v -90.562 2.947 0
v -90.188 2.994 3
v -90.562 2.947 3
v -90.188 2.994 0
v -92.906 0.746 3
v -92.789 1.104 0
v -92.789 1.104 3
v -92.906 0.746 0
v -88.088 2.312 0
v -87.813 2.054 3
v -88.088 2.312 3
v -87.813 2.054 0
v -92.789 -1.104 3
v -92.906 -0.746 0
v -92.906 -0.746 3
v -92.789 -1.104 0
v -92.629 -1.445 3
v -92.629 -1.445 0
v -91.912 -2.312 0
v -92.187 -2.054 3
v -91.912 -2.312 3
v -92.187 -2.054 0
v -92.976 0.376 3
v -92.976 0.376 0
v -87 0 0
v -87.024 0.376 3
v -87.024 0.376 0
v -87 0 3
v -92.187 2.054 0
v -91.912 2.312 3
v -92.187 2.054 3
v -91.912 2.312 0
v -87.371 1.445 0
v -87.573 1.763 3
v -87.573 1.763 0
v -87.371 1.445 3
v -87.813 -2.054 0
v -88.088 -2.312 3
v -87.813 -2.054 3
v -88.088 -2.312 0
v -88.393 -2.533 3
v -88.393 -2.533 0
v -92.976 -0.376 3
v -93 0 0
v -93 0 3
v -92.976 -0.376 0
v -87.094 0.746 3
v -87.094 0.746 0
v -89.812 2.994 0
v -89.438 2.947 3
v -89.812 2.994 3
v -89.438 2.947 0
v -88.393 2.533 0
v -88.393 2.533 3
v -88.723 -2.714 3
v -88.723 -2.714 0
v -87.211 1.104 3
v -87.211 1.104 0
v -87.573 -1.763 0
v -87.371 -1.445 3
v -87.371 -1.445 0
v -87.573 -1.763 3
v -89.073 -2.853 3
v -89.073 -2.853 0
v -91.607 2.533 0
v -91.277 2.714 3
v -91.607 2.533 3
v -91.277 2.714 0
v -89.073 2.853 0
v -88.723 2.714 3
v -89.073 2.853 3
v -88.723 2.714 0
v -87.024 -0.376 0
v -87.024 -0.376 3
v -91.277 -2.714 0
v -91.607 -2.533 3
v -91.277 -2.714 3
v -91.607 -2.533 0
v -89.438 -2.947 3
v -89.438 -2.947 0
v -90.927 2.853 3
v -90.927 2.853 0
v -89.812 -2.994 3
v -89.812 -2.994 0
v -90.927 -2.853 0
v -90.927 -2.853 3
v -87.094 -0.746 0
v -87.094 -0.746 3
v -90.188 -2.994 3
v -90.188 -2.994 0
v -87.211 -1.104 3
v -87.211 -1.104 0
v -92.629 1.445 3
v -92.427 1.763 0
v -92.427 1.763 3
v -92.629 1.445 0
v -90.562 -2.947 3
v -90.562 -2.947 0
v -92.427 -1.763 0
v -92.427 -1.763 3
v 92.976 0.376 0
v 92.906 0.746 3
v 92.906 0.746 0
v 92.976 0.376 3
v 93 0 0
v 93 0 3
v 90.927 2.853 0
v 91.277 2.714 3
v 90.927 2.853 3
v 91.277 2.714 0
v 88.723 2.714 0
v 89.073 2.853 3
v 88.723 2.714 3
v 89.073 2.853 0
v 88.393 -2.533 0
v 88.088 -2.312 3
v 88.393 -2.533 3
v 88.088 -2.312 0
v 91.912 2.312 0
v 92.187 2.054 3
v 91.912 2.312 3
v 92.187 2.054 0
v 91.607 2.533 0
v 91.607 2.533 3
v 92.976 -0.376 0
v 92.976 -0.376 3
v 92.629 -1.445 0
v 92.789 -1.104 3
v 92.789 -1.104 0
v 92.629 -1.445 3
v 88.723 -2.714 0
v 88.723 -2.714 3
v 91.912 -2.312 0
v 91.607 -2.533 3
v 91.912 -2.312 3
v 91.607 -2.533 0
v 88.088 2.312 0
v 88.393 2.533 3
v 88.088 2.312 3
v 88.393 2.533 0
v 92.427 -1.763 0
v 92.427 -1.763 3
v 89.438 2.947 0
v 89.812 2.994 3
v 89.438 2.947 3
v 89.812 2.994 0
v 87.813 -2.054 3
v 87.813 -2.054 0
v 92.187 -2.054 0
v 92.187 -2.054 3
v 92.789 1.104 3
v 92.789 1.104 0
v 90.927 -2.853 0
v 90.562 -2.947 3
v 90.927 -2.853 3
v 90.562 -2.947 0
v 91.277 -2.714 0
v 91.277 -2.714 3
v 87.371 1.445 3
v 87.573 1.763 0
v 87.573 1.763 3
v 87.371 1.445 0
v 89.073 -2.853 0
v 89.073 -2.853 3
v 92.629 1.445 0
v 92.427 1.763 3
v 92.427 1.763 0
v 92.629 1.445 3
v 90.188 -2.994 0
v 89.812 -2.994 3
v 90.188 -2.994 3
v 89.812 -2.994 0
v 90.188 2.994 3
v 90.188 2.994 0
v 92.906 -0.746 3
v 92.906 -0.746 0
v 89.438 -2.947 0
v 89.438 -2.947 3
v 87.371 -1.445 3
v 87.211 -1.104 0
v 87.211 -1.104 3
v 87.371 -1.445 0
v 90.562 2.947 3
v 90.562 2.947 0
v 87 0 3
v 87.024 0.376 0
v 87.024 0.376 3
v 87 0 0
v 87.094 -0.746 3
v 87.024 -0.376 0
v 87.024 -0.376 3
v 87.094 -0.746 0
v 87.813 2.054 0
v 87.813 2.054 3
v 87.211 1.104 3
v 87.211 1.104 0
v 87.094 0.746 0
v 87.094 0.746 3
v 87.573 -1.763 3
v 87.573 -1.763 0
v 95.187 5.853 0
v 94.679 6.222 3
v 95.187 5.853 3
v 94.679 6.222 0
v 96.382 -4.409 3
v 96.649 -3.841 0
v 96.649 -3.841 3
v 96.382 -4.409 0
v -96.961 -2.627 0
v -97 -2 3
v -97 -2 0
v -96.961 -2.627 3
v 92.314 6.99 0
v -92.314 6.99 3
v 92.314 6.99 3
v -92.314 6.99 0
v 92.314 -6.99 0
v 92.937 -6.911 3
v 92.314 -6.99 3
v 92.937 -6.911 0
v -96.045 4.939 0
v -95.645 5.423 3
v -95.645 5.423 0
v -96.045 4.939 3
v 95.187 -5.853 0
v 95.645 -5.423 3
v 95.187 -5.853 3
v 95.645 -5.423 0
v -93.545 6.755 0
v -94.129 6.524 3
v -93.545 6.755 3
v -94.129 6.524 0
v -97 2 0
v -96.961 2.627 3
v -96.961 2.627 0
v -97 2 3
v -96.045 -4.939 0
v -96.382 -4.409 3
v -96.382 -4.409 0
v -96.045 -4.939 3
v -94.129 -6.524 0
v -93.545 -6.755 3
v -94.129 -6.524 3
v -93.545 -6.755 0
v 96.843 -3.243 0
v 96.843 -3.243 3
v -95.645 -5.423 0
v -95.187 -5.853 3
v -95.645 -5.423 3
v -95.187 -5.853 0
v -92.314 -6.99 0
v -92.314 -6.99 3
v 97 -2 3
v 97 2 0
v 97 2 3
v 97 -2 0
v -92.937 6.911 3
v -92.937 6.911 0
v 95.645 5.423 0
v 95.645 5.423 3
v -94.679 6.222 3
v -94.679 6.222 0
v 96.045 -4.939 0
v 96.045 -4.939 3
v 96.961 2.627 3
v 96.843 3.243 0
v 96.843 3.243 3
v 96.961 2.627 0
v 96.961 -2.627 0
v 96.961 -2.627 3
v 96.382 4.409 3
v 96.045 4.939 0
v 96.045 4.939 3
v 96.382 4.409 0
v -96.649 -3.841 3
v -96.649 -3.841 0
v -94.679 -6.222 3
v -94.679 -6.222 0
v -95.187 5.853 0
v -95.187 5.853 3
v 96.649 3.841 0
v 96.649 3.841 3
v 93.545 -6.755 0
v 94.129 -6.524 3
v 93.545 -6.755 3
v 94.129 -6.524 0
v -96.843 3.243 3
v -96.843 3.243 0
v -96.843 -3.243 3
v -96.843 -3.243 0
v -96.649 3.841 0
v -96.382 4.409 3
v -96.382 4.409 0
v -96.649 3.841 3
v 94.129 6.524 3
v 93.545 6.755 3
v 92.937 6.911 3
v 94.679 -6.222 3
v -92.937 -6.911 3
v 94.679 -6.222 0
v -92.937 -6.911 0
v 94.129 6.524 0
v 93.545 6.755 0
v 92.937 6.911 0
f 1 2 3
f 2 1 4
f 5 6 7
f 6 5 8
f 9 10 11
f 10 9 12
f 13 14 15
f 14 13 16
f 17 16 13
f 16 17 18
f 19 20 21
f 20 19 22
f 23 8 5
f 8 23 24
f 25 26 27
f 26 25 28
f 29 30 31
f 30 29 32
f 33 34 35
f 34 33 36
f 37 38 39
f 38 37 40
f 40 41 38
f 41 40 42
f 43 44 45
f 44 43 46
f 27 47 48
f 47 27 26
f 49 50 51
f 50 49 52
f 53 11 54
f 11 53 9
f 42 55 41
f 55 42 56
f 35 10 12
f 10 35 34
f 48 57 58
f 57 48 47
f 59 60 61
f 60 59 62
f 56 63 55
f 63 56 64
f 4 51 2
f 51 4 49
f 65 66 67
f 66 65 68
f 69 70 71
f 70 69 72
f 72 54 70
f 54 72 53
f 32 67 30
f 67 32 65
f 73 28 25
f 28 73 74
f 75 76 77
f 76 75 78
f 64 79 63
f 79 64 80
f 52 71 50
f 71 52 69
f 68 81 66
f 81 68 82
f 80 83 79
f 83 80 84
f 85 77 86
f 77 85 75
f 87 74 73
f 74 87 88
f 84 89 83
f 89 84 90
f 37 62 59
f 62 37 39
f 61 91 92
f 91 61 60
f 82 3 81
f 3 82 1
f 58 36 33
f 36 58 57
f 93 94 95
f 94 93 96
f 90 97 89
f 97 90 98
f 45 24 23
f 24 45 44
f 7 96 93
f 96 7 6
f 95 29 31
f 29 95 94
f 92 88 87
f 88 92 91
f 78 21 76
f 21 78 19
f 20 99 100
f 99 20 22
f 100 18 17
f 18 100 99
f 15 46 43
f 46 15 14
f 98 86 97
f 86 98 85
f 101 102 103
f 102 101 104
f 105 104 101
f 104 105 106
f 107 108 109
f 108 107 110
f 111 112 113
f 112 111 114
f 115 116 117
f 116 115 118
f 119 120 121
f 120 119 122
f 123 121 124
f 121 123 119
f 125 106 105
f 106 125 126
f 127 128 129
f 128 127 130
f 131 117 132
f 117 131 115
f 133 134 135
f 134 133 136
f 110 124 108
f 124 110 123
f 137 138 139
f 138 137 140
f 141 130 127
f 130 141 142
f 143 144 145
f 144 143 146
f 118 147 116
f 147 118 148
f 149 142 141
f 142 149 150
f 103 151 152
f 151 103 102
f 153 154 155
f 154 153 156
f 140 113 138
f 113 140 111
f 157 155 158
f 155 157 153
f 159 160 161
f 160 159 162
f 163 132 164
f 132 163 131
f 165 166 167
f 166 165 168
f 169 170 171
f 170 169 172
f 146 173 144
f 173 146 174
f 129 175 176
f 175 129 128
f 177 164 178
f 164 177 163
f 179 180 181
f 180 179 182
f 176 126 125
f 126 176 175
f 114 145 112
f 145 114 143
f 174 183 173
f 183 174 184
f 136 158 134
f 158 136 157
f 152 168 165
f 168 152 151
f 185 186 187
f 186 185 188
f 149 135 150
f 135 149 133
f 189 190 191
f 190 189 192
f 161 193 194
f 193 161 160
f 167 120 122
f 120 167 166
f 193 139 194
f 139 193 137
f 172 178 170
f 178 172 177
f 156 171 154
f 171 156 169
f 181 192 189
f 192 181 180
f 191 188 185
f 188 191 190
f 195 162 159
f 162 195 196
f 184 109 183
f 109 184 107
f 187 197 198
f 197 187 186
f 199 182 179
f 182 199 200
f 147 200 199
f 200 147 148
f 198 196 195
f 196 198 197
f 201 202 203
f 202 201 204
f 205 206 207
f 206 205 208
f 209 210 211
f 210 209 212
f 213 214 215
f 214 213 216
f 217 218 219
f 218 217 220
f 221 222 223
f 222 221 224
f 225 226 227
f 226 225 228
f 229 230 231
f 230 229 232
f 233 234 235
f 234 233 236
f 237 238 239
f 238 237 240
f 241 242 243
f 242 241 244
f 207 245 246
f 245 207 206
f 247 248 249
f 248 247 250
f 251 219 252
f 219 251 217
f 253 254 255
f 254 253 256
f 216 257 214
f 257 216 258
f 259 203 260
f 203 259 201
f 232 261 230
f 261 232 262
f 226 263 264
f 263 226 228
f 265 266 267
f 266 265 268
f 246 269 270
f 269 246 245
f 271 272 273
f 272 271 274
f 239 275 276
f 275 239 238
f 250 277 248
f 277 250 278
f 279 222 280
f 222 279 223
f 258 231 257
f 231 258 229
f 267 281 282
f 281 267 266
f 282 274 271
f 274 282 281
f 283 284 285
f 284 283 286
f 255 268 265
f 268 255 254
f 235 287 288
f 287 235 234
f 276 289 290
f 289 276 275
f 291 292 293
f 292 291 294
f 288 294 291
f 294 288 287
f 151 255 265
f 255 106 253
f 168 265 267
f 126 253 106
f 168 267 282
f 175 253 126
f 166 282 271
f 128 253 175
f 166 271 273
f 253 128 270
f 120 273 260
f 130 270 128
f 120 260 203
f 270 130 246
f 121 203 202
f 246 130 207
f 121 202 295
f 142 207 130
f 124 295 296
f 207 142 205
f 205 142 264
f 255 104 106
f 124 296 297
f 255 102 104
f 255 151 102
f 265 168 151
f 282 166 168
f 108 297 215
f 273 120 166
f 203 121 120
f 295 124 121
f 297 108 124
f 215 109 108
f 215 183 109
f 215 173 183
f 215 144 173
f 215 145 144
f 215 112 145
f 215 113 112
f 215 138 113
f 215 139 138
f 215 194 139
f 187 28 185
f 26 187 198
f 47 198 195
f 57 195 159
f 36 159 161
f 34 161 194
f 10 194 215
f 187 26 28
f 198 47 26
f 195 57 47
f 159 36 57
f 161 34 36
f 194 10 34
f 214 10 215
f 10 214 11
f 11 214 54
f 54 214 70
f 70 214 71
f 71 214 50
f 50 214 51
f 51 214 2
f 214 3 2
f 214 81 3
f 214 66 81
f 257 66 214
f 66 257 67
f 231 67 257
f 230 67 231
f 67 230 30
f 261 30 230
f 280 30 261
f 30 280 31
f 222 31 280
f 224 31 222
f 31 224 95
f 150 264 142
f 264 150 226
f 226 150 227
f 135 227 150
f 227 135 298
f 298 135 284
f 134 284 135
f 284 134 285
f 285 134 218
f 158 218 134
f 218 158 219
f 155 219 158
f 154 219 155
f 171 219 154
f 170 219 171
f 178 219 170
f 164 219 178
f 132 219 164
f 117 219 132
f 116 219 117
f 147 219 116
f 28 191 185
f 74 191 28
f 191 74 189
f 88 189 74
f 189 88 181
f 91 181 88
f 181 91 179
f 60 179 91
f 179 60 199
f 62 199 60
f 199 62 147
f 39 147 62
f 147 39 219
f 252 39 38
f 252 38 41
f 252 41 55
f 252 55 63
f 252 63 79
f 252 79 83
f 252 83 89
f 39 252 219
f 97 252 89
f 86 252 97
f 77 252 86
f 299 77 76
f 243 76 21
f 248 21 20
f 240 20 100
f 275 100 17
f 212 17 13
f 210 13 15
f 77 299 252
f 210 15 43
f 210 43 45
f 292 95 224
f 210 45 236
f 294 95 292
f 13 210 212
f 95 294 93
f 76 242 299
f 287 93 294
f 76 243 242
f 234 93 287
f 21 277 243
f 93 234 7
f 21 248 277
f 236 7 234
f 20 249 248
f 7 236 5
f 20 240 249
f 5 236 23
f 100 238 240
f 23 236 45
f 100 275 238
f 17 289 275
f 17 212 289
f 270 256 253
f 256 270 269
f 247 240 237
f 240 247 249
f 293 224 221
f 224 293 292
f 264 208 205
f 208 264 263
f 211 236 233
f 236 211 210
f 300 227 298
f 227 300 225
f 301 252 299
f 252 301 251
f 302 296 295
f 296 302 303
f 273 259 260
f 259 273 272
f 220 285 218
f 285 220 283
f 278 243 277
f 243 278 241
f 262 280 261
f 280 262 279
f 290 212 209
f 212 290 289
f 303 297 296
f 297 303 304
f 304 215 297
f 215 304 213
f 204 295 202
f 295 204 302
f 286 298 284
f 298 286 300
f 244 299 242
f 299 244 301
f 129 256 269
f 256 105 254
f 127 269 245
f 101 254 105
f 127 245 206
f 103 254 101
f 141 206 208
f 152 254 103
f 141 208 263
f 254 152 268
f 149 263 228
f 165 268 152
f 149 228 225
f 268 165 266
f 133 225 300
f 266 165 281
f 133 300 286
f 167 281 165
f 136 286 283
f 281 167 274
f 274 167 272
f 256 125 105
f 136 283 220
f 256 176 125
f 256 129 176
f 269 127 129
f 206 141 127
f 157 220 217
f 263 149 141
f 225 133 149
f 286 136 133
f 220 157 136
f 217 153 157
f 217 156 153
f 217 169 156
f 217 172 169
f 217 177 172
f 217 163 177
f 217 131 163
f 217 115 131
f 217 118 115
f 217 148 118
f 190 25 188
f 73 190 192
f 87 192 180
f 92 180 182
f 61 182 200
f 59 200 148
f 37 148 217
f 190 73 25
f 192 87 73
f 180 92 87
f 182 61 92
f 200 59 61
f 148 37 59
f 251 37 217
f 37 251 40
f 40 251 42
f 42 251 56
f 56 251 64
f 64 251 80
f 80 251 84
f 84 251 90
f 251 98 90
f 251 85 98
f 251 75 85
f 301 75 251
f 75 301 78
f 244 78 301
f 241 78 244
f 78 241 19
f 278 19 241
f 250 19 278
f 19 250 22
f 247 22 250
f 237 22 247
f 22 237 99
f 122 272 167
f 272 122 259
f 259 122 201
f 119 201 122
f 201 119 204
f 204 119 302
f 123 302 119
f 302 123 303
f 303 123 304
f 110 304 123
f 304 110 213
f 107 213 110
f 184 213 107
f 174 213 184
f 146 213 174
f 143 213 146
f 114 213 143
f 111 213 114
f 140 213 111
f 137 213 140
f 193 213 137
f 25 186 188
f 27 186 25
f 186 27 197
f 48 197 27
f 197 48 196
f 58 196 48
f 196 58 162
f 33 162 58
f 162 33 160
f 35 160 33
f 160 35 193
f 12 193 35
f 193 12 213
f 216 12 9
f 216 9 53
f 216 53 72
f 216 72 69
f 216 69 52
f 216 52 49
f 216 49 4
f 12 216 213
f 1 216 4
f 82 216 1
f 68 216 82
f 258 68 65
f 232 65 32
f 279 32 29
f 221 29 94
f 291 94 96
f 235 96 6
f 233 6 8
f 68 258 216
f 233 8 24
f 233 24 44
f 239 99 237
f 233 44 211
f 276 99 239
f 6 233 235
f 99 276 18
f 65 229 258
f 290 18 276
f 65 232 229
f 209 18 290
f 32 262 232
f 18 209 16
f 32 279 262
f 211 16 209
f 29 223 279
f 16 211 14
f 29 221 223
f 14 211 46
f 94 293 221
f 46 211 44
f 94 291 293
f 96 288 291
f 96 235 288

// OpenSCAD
$fn = 50;


difference() {
	union() {
		hull() {
			translate(v = [-92.0000000000, 2.0000000000, 0]) {
				cylinder(h = 3, r = 5);
			}
			translate(v = [92.0000000000, 2.0000000000, 0]) {
				cylinder(h = 3, r = 5);
			}
			translate(v = [-92.0000000000, -2.0000000000, 0]) {
				cylinder(h = 3, r = 5);
			}
			translate(v = [92.0000000000, -2.0000000000, 0]) {
				cylinder(h = 3, r = 5);
			}
		}
	}
	union() {
		translate(v = [-90.0000000000, 0.0000000000, -100.0000000000]) {
			cylinder(h = 200, r = 3.0000000000);
		}
		translate(v = [-90.0000000000, 0.0000000000, -100.0000000000]) {
			cylinder(h = 200, r = 3.0000000000);
		}
		translate(v = [90.0000000000, 0.0000000000, -100.0000000000]) {
			cylinder(h = 200, r = 3.0000000000);
		}
		translate(v = [90.0000000000, 0.0000000000, -100.0000000000]) {
			cylinder(h = 200, r = 3.0000000000);
		}
	}
}
